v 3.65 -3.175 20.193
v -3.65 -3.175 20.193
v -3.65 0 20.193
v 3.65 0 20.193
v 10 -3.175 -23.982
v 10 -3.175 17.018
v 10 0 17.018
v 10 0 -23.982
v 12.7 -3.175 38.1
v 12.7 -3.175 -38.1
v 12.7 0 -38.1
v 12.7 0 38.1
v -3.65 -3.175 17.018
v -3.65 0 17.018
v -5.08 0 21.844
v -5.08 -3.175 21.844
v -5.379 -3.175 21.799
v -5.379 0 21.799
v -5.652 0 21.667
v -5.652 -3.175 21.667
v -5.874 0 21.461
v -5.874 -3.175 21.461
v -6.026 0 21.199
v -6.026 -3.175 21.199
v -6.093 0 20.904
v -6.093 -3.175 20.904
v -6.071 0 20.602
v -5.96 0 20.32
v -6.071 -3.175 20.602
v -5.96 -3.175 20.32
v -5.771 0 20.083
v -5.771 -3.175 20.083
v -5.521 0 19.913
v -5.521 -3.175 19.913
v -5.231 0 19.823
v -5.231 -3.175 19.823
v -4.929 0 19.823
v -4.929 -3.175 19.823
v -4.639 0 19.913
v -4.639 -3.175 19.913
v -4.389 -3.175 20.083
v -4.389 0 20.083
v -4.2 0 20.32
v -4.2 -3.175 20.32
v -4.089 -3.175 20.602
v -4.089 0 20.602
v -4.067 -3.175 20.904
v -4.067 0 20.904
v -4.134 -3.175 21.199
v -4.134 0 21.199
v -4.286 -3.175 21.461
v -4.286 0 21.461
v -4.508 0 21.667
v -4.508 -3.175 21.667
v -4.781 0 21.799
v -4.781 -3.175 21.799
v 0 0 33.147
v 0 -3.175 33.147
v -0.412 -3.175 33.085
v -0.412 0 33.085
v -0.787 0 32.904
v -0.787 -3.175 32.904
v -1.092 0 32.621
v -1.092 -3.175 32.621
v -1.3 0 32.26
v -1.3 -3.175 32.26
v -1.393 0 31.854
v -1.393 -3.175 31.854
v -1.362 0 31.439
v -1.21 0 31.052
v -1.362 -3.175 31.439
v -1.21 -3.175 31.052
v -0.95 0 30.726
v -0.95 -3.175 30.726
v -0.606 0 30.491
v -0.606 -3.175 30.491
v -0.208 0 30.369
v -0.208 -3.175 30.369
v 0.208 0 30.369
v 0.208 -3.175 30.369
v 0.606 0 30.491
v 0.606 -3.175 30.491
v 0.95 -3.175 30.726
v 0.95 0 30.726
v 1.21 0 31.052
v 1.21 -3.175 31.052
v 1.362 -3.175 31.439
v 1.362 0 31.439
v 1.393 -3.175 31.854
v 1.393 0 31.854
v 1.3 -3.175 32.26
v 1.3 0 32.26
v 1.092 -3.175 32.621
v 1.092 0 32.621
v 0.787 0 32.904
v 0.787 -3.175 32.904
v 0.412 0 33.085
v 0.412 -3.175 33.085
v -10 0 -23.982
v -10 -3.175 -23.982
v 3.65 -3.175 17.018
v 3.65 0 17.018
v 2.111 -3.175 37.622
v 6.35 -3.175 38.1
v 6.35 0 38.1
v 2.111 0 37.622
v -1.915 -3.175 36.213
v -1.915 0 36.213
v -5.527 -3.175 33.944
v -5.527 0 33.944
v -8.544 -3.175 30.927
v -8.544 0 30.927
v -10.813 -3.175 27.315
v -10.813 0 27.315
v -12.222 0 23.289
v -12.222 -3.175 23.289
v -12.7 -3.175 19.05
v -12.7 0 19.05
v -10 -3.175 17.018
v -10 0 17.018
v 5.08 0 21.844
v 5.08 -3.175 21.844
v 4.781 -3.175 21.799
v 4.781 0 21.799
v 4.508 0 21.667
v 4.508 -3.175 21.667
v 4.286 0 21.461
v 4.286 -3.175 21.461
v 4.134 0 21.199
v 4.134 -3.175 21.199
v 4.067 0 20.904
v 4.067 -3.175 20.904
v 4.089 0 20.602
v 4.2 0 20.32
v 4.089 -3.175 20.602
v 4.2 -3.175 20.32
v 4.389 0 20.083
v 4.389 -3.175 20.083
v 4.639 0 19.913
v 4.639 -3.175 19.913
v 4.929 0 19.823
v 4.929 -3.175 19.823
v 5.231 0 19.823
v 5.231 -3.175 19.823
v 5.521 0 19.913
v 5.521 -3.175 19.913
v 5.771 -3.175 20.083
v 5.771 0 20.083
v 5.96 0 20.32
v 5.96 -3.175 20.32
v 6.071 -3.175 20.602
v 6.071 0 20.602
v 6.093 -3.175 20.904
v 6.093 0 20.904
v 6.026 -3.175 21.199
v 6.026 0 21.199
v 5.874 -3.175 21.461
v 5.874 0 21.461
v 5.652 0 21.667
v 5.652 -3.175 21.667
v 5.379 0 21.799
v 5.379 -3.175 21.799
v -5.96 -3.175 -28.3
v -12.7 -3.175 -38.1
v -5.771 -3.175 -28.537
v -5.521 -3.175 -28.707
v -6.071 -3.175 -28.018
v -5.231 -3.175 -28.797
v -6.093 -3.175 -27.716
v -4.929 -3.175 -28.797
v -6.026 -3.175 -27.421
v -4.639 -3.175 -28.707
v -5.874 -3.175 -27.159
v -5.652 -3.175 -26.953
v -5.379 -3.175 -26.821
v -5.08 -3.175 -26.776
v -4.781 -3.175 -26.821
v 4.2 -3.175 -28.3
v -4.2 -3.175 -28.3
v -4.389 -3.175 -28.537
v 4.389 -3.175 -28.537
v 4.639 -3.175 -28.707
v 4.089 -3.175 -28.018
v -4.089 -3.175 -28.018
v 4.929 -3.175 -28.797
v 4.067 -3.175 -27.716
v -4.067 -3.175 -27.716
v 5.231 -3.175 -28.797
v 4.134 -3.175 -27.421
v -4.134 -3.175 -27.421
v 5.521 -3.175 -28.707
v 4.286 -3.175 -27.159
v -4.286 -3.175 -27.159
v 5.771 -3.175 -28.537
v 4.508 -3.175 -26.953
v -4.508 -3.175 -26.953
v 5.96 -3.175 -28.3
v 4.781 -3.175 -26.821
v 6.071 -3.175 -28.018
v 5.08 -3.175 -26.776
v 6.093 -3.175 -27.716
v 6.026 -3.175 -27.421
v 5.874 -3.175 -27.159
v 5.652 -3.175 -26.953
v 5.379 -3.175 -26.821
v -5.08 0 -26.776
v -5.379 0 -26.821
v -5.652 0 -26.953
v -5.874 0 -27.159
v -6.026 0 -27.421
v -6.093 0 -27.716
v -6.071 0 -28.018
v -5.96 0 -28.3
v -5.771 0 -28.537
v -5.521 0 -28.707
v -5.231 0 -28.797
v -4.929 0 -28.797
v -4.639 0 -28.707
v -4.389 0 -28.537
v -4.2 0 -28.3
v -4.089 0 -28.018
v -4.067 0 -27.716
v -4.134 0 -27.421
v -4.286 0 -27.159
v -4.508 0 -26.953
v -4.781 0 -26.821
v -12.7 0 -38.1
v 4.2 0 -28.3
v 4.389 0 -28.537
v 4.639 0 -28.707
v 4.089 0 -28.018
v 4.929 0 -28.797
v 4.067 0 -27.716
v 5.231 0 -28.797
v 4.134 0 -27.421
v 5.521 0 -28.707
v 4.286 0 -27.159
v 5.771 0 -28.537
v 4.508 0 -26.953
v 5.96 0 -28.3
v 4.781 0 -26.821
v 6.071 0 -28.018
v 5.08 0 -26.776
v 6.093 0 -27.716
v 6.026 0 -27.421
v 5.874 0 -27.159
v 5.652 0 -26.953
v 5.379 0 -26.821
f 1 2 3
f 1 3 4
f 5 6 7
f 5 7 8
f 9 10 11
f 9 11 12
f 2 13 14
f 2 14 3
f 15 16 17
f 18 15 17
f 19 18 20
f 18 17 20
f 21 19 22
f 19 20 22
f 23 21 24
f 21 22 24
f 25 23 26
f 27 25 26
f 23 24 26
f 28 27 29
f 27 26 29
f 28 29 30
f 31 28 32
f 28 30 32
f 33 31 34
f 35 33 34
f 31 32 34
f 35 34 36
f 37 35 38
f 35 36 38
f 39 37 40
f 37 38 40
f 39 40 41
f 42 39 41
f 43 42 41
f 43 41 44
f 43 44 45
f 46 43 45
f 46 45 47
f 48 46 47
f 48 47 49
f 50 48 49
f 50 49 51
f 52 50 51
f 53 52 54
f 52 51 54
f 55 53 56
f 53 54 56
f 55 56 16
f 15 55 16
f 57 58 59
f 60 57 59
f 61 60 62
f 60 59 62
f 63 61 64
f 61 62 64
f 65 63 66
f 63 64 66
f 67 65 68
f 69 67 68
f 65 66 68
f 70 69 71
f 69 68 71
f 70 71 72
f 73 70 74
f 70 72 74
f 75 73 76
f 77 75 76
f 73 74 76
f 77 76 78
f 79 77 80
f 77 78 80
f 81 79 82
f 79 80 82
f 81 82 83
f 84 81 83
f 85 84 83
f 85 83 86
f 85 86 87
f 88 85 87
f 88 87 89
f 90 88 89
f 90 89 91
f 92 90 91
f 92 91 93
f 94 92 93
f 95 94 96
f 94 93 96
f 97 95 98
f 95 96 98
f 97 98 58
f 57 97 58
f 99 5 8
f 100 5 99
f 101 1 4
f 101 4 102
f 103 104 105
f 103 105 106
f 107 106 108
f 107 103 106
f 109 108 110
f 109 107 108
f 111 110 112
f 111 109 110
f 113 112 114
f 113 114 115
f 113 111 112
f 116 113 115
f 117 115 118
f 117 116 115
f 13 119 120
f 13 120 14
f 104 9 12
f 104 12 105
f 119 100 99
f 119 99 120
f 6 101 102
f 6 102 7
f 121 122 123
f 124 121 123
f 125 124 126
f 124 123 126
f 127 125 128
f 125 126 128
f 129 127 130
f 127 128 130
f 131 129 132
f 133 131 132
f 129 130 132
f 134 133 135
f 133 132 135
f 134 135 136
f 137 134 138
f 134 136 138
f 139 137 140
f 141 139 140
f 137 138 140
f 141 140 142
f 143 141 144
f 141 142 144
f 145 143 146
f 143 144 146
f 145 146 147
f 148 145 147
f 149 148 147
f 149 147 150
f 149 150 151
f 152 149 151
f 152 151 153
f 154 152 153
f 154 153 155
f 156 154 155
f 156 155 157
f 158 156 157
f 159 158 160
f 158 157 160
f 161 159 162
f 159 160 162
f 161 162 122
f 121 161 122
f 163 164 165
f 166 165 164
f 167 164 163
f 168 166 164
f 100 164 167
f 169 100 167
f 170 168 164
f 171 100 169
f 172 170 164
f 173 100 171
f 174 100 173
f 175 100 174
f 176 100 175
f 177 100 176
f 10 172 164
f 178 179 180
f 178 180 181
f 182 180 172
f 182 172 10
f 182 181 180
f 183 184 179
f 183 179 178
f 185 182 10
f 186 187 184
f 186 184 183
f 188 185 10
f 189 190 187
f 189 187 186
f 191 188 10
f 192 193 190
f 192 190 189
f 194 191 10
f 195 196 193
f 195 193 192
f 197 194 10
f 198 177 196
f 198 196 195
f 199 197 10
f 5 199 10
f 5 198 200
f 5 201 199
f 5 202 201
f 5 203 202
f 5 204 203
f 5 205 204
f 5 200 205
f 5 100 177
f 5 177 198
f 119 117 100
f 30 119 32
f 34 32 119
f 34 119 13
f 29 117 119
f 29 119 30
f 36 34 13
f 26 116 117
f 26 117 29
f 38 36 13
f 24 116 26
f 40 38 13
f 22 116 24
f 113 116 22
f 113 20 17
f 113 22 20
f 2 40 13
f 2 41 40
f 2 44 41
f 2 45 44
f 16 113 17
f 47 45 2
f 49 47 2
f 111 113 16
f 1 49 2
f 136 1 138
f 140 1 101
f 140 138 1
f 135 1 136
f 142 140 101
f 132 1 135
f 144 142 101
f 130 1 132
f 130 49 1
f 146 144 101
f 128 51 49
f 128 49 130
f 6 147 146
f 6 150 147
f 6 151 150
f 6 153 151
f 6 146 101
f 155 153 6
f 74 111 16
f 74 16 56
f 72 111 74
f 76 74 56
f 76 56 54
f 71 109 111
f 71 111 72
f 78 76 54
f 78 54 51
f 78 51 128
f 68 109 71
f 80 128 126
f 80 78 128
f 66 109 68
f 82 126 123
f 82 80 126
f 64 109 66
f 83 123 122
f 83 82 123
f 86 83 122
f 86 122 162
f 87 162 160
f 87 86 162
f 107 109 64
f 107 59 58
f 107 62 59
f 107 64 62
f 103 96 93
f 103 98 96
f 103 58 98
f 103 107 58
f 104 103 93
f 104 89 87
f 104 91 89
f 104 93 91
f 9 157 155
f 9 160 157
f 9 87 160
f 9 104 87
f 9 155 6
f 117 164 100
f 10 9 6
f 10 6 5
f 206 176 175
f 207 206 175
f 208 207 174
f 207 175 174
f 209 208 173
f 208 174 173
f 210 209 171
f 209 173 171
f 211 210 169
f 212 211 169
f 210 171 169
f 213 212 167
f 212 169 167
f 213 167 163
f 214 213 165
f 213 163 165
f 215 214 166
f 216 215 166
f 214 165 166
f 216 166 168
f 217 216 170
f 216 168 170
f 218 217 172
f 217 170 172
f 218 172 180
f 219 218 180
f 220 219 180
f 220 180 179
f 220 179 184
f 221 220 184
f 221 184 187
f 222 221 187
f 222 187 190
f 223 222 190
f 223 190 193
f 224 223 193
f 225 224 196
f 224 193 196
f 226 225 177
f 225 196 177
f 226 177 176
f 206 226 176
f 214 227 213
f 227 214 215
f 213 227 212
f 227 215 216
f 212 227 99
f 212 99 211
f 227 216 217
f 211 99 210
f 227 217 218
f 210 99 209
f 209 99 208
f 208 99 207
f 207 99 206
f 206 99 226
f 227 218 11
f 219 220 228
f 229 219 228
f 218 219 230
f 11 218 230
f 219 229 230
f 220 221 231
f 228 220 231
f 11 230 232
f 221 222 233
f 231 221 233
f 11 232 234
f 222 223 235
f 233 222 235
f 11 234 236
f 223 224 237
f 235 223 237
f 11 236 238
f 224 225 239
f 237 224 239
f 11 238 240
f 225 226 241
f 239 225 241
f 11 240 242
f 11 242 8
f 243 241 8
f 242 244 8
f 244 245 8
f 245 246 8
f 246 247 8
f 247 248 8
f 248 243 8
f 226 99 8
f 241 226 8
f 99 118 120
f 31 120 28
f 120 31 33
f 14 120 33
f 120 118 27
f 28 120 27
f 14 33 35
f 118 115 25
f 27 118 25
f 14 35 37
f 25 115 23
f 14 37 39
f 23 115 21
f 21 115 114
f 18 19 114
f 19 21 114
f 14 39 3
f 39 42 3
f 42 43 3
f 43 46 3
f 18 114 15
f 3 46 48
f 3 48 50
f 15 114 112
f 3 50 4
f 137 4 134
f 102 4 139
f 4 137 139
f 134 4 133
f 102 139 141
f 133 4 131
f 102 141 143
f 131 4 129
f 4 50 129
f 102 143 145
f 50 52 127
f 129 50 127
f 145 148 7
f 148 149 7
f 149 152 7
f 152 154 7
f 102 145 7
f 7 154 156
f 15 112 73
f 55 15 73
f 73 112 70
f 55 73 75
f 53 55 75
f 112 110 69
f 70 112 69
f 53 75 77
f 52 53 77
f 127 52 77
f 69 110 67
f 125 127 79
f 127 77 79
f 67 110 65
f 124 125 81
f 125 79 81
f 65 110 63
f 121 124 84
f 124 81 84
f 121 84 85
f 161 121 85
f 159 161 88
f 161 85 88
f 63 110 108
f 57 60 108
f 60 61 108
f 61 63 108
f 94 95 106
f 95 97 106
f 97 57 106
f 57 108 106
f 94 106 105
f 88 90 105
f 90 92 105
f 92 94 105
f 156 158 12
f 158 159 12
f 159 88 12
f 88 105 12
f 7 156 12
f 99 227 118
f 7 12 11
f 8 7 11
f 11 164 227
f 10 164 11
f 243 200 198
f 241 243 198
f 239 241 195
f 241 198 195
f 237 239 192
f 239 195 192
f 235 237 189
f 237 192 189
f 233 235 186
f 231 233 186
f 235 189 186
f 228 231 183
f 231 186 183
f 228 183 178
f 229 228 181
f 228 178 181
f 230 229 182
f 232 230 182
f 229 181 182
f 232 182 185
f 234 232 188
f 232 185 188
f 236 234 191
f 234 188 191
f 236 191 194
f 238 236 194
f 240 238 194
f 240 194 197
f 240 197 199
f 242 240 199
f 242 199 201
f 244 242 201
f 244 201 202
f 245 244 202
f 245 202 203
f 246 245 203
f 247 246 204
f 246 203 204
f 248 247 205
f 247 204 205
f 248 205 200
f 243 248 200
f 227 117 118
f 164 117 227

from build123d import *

# Parameters (mm, degrees)
SKETCH1_R           = 1.016
SKETCH1_R_2         = 1.397
BOSS_EXTRUDE1_DEPTH = 3.175


with BuildPart() as part:
    # Sketch1 → Boss-Extrude1 (new body)
    with BuildSketch(Plane.XZ.offset(3.175)):
        with BuildLine():
            Line((12.7, 38.1), (6.35, 38.1))
            ThreePointArc((6.35, 38.1), (-7.120384182, 32.520384182), (-12.7, 19.05))
            Line((-12.7, 19.05), (-12.7, -38.1))
            Line((-12.7, -38.1), (12.7, -38.1))
            Line((12.7, -38.1), (12.7, 38.1))
        make_face()
        with Locations(Location((5.08, 20.828, 0), (0, 0, 90))):  # turned: the seam where the file's is
            Circle(SKETCH1_R, mode=Mode.SUBTRACT)
        with Locations(Location((-5.08, 20.828, 0), (0, 0, 90))):  # turned: the seam where the file's is
            Circle(SKETCH1_R, mode=Mode.SUBTRACT)
        with Locations(Location((-5.08, -27.792, 0), (0, 0, 90))):  # turned: the seam where the file's is
            Circle(SKETCH1_R, mode=Mode.SUBTRACT)
        with Locations(Location((5.08, -27.792, 0), (0, 0, 90))):  # turned: the seam where the file's is
            Circle(SKETCH1_R, mode=Mode.SUBTRACT)
        with Locations(Location((0, 31.75, 0), (0, 0, 90))):  # turned: the seam where the file's is
            Circle(SKETCH1_R_2, mode=Mode.SUBTRACT)
        Polygon((3.65, 17.018), (10, 17.018), (10, -23.982), (-10, -23.982), (-10, 17.018), (-3.65, 17.018), (-3.65, 20.193), (3.65, 20.193), align=None, mode=Mode.SUBTRACT)
    extrude(amount=-BOSS_EXTRUDE1_DEPTH)


solid = part.part
